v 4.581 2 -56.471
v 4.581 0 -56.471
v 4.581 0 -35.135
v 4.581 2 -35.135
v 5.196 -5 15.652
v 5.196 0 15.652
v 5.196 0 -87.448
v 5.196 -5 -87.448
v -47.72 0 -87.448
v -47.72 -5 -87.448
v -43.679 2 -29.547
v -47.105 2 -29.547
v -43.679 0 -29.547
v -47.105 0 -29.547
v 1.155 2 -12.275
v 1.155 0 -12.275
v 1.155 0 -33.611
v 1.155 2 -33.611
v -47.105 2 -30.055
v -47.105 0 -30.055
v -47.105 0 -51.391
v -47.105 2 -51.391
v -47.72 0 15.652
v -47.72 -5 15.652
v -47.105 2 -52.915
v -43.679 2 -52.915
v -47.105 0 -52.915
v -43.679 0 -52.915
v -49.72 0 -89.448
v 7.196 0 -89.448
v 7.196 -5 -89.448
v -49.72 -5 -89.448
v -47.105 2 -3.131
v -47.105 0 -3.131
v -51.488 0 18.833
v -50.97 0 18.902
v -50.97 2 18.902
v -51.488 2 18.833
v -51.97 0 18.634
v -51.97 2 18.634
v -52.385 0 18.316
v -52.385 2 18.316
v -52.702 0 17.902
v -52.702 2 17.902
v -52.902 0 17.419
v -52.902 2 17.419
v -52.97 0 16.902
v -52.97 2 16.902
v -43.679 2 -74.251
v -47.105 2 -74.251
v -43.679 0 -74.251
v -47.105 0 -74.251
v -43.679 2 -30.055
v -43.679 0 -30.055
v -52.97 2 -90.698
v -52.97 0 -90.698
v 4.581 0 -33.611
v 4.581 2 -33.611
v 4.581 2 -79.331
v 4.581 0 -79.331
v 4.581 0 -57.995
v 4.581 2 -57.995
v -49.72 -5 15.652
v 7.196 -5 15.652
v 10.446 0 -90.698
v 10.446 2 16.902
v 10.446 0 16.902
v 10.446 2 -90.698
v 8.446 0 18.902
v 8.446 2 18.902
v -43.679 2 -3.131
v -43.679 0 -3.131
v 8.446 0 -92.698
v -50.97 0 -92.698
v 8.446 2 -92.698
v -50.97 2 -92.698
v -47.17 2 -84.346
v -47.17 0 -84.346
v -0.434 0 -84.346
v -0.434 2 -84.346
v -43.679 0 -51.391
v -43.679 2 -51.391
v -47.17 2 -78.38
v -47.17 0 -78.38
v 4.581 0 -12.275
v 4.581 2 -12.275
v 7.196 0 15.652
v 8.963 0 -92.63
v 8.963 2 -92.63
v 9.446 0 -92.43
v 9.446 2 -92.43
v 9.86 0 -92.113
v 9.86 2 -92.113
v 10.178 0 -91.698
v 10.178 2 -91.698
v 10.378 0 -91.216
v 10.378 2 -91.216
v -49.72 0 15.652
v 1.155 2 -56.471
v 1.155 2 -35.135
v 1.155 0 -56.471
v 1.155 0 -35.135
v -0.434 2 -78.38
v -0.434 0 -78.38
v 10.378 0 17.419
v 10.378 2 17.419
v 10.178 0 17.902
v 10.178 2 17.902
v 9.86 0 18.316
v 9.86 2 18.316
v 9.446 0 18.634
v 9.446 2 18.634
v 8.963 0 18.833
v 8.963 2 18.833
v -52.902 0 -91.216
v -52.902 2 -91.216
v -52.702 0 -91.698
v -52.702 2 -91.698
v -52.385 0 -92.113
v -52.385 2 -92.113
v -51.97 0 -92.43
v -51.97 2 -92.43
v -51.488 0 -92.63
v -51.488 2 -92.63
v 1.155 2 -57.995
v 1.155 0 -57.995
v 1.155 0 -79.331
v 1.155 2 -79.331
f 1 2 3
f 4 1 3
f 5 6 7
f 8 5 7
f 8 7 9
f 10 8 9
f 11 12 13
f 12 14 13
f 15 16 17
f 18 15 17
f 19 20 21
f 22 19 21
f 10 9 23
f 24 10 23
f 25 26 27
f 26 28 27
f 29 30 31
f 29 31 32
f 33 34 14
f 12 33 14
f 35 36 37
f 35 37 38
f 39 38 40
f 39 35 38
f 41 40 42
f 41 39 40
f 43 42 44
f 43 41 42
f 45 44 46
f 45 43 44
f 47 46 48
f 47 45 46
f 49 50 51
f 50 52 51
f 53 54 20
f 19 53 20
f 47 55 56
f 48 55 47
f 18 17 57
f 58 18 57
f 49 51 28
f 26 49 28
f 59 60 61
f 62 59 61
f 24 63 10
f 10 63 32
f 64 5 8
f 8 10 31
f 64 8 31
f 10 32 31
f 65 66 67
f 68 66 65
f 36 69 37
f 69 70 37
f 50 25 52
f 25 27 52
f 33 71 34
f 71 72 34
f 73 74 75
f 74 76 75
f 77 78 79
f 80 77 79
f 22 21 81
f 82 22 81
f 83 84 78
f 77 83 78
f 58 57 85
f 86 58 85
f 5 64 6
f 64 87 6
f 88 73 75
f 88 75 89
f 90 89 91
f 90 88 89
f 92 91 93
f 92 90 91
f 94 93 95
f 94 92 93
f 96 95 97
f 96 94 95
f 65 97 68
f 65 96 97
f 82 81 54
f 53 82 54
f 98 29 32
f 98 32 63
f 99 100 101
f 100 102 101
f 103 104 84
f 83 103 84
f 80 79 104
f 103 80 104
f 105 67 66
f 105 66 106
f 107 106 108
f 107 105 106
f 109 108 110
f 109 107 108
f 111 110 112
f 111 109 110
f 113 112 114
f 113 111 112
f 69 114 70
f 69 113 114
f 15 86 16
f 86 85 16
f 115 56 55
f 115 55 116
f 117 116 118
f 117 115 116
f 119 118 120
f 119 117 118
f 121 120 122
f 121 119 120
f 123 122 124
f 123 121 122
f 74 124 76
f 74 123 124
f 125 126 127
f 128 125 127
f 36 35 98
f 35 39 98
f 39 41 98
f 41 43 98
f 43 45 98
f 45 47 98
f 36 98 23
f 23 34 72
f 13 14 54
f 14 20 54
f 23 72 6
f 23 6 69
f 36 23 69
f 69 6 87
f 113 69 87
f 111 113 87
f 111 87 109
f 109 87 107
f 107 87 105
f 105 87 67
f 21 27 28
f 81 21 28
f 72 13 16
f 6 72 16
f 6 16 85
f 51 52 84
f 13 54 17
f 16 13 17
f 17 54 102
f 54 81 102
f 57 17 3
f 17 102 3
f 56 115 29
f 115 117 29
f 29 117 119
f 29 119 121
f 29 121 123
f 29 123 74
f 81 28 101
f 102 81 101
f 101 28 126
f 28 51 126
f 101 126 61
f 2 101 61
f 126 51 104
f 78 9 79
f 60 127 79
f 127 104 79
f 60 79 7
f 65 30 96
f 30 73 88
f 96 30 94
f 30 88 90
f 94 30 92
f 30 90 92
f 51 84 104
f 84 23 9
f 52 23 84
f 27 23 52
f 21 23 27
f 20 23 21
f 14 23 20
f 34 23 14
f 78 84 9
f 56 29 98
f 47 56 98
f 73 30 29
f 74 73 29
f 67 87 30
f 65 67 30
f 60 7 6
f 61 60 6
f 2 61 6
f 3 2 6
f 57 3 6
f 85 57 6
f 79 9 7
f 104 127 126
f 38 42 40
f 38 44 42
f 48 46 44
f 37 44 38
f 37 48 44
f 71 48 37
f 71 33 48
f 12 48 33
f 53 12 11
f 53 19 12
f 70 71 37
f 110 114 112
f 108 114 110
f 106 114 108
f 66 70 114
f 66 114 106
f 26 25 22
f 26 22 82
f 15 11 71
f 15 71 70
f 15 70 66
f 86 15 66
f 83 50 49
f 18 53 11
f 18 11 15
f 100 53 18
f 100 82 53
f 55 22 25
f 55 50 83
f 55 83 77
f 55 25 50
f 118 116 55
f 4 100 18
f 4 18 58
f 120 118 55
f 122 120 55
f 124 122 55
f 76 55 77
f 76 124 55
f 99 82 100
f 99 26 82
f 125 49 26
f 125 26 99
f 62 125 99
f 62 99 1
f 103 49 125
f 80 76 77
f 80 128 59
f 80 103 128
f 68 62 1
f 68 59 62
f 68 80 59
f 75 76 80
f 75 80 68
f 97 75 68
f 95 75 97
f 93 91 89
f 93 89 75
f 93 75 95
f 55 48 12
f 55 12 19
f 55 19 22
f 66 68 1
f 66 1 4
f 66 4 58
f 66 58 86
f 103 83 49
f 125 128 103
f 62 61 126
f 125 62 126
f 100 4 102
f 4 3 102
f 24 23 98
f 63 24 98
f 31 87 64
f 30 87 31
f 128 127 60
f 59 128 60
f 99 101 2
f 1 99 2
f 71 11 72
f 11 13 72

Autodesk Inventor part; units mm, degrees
ref_plane "YZ Plane" through (0, 0, 0) normal (1, 0, 0) x (0, 1, 0)
ref_plane "XZ Plane" through (0, 0, 0) normal (0, 1, 0) x (-1, 0, 0)
ref_plane "XY Plane" through (0, 0, 0) normal (0, 0, 1) x (1, 0, 0)
sketch "Náčrt1" plane through (0, 0, 0) normal (0, 1, 0) x (-1, 0, 0)
  line L0 (-6.677663, 17.076554) -> (49.20234, 17.076554)
  line L1 (-9.217661, 14.536556) -> (-9.217661, -88.33345)
  line L2 (-6.677663, -90.873447) -> (49.20234, -90.873447)
  line L3 (51.742337, 14.536556) -> (51.742337, -88.33345)
  line L4 (47.105338, -3.131448) -> (47.105338, -74.251447)
  line L5 (43.679337, -3.131448) -> (47.105338, -3.131448)
  line L6 (43.679337, -29.547447) -> (43.679337, -3.131448)
  line L7 (43.679337, -29.547447) -> (47.105338, -29.547447)
  line L8 (43.679337, -30.055447) -> (47.105338, -30.055447)
  line L9 (43.679337, -51.391447) -> (43.679337, -30.055447)
  line L10 (47.105338, -51.391447) -> (43.679337, -51.391447)
  line L11 (43.679337, -52.915447) -> (47.105338, -52.915447)
  line L12 (43.679337, -74.251447) -> (43.679337, -52.915447)
  line L13 (47.105338, -74.251447) -> (43.679337, -74.251447)
  line L14 (0.434339, -78.380447) -> (47.170339, -78.380447)
  line L15 (47.170339, -84.346448) -> (47.170339, -78.380447)
  line L16 (47.170339, -84.346448) -> (0.434339, -84.346448)
  line L17 (0.434339, -84.346448) -> (0.434339, -78.380447)
  line L18 (-1.154661, -57.995446) -> (-1.154661, -79.331446)
  line L19 (-4.580662, -79.331446) -> (-4.580662, -12.275449)
  line L20 (-1.154661, -79.331446) -> (-4.580662, -79.331446)
  line L21 (-4.580662, -57.995446) -> (-1.154661, -57.995446)
  line L22 (-1.154661, -56.471446) -> (-4.580662, -56.471446)
  line L23 (-1.154661, -35.135447) -> (-1.154661, -56.471446)
  line L24 (-4.580662, -35.135447) -> (-1.154661, -35.135447)
  line L25 (-1.154661, -33.611447) -> (-4.580662, -33.611447)
  line L26 (-1.154661, -12.275449) -> (-1.154661, -33.611447)
  line L27 (-4.580662, -12.275449) -> (-1.154661, -12.275449)
  circle A0 centre (-6.686866, -88.348377) radius 2.522363
  circle A1 centre (49.198008, -88.332369) radius 2.54409
  circle A2 centre (49.211542, 14.551484) radius 2.522363
  circle A3 centre (-6.692632, 14.545779) radius 2.522319
  line L28 (51.742337, 17.076554) -> (-9.217661, 17.076554)
  line L29 (-9.217661, 17.076554) -> (-9.217661, -90.873447)
  line L30 (-9.217661, -90.873447) -> (51.742337, -90.873447)
  line L31 (51.742337, -90.873447) -> (51.742337, 17.076554)
  line L32 (-1.154661, -12.275449) -> (-4.580662, -12.275449)
  line L33 (-4.580662, -12.275449) -> (-4.580662, -33.611447)
  line L34 (-4.580662, -33.611447) -> (-1.154661, -33.611447)
  line L35 (-1.154661, -33.611447) -> (-1.154661, -12.275449)
  line L36 (-4.580662, -35.135447) -> (-1.154661, -35.135447)
  line L37 (-1.154661, -35.135447) -> (-1.154661, -56.471446)
  line L38 (-1.154661, -56.471446) -> (-4.580662, -56.471446)
  line L39 (-4.580662, -56.471446) -> (-4.580662, -35.135447)
  line L40 (-4.580662, -57.995446) -> (-1.154661, -57.995446)
  line L41 (-1.154661, -57.995446) -> (-1.154661, -79.331446)
  line L42 (-1.154661, -79.331446) -> (-4.580662, -79.331446)
  line L43 (-4.580662, -79.331446) -> (-4.580662, -57.995446)
  line L44 (0.434339, -84.346448) -> (47.170339, -84.346448)
  line L45 (47.170339, -84.346448) -> (47.170339, -78.380447)
  line L46 (47.170339, -78.380447) -> (0.434339, -78.380447)
  line L47 (0.434339, -78.380447) -> (0.434339, -84.346448)
  line L48 (43.679337, -74.251447) -> (47.105338, -74.251447)
  line L49 (47.105338, -74.251447) -> (47.105338, -52.915447)
  line L50 (47.105338, -52.915447) -> (43.679337, -52.915447)
  line L51 (43.679337, -52.915447) -> (43.679337, -74.251447)
  line L52 (47.105338, -30.055447) -> (43.679337, -30.055447)
  line L53 (43.679337, -30.055447) -> (43.679337, -51.391447)
  line L54 (43.679337, -51.391447) -> (47.105338, -51.391447)
  line L55 (47.105338, -51.391447) -> (47.105338, -30.055447)
  line L56 (43.679337, -29.547447) -> (47.105338, -29.547447)
  line L57 (47.105338, -29.547447) -> (47.105338, -3.131448)
  line L58 (47.105338, -3.131448) -> (43.679337, -3.131448)
  line L59 (43.679337, -3.131448) -> (43.679337, -29.547447)
  point P0 (0, 0)
  dimension "d0" = 0
  dimension "d1" = 0
  dimension "d2" = 0
  dimension "d3" = 0
sketch "Náčrt1 outline for Vysunutí1" plane through (0, 0, 0) normal (0, 1, 0) x (-1, 0, 0)
  line L0 (51.742337, 14.536556) -> (51.742337, 17.076554)
  line L1 (51.742337, -88.33345) -> (51.742337, 14.536556)
  line L2 (51.742337, 17.076554) -> (49.20234, 17.076554)
  line L3 (51.742337, -90.873447) -> (51.742337, -88.33345)
  line L4 (49.20234, 17.076554) -> (-6.677663, 17.076554)
  line L5 (49.20234, -90.873447) -> (51.742337, -90.873447)
  line L6 (-6.677663, 17.076554) -> (-9.217661, 17.076554)
  line L7 (-6.677663, -90.873447) -> (49.20234, -90.873447)
  line L8 (-9.217661, 17.076554) -> (-9.217661, 14.536556)
  line L9 (-9.217661, -90.873447) -> (-6.677663, -90.873447)
  line L10 (-9.217661, 14.536556) -> (-9.217661, -88.33345)
  line L11 (-9.217661, -88.33345) -> (-9.217661, -90.873447)
  line L12 (-4.580662, -57.995446) -> (-1.154661, -57.995446)
  line L13 (-4.580662, -79.331446) -> (-4.580662, -57.995446)
  line L14 (-1.154661, -79.331446) -> (-4.580662, -79.331446)
  line L15 (-1.154661, -57.995446) -> (-1.154661, -79.331446)
  line L16 (-4.580662, -56.471446) -> (-4.580662, -35.135447)
  line L17 (-1.154661, -56.471446) -> (-4.580662, -56.471446)
  line L18 (-1.154661, -35.135447) -> (-1.154661, -56.471446)
  line L19 (-4.580662, -35.135447) -> (-1.154661, -35.135447)
  line L20 (0.434339, -84.346448) -> (0.434339, -78.380447)
  line L21 (47.170339, -84.346448) -> (0.434339, -84.346448)
  line L22 (47.170339, -78.380447) -> (47.170339, -84.346448)
  line L23 (0.434339, -78.380447) -> (47.170339, -78.380447)
  line L24 (47.105338, -52.915447) -> (47.105338, -74.251447)
  line L25 (43.679337, -52.915447) -> (47.105338, -52.915447)
  line L26 (43.679337, -74.251447) -> (43.679337, -52.915447)
  line L27 (47.105338, -74.251447) -> (43.679337, -74.251447)
  line L28 (-4.580662, -33.611447) -> (-4.580662, -12.275449)
  line L29 (-1.154661, -33.611447) -> (-4.580662, -33.611447)
  line L30 (-1.154661, -12.275449) -> (-1.154661, -33.611447)
  line L31 (-4.580662, -12.275449) -> (-1.154661, -12.275449)
  line L32 (47.105338, -30.055447) -> (47.105338, -51.391447)
  line L33 (43.679337, -30.055447) -> (47.105338, -30.055447)
  line L34 (43.679337, -51.391447) -> (43.679337, -30.055447)
  line L35 (47.105338, -51.391447) -> (43.679337, -51.391447)
  line L36 (47.105338, -29.547447) -> (43.679337, -29.547447)
  line L37 (47.105338, -3.131448) -> (47.105338, -29.547447)
  line L38 (43.679337, -3.131448) -> (47.105338, -3.131448)
  line L39 (43.679337, -29.547447) -> (43.679337, -3.131448)
extrude "Vysunutí1" add sketch "Náčrt1 outline for Vysunutí1" along normal blind 2
sketch "Náčrt2" plane through (0, 2, 0) normal (0, 1, 0) x (1, 0, 0)
  line L0 (-51.742337, -17.076554) -> (9.217661, -17.076554)
  line L1 (9.217661, -17.076554) -> (9.217661, 90.873447)
  line L2 (9.217661, 90.873447) -> (-51.742337, 90.873447)
  line L3 (-51.742337, 90.873447) -> (-51.742337, -17.076554)
  line L4 (-47.105338, 29.547447) -> (-43.679337, 29.547447)
  line L5 (-43.679337, 29.547447) -> (-43.679337, 3.131448)
  line L6 (-43.679337, 3.131448) -> (-47.105338, 3.131448)
  line L7 (-47.105338, 3.131448) -> (-47.105338, 29.547447)
  line L8 (-47.105338, 30.055447) -> (-47.105338, 51.391447)
  line L9 (-47.105338, 51.391447) -> (-43.679337, 51.391447)
  line L10 (-43.679337, 51.391447) -> (-43.679337, 30.055447)
  line L11 (-43.679337, 30.055447) -> (-47.105338, 30.055447)
  line L12 (4.580662, 57.995446) -> (1.154661, 57.995446)
  line L13 (1.154661, 57.995446) -> (1.154661, 79.331446)
  line L14 (1.154661, 79.331446) -> (4.580662, 79.331446)
  line L15 (4.580662, 79.331446) -> (4.580662, 57.995446)
  line L16 (4.580662, 56.471446) -> (4.580662, 35.135447)
  line L17 (4.580662, 35.135447) -> (1.154661, 35.135447)
  line L18 (1.154661, 35.135447) -> (1.154661, 56.471446)
  line L19 (1.154661, 56.471446) -> (4.580662, 56.471446)
  line L20 (4.580662, 33.611447) -> (4.580662, 12.275449)
  line L21 (4.580662, 12.275449) -> (1.154661, 12.275449)
  line L22 (1.154661, 12.275449) -> (1.154661, 33.611447)
  line L23 (1.154661, 33.611447) -> (4.580662, 33.611447)
  line L24 (-0.434339, 84.346448) -> (-0.434339, 78.380447)
  line L25 (-0.434339, 78.380447) -> (-47.170339, 78.380447)
  line L26 (-47.170339, 78.380447) -> (-47.170339, 84.346448)
  line L27 (-47.170339, 84.346448) -> (-0.434339, 84.346448)
  line L28 (-47.105338, 52.915447) -> (-47.105338, 74.251447)
  line L29 (-47.105338, 74.251447) -> (-43.679337, 74.251447)
  line L30 (-43.679337, 74.251447) -> (-43.679337, 52.915447)
  line L31 (-43.679337, 52.915447) -> (-47.105338, 52.915447)
  line L32 (-52.742337, -18.076554) -> (10.217661, -18.076554)
  line L33 (10.217661, -18.076554) -> (10.217661, 91.873447)
  line L34 (10.217661, 91.873447) -> (-52.742337, 91.873447)
  line L35 (-52.742337, 91.873447) -> (-52.742337, -18.076554)
  point P0 (0, 0)
  dimension "d6" = 1
extrude "Vysunutí2" add sketch "Náčrt2" against normal up to surface (2 mm away) contours L35 L34 L33 L32
sketch "Náčrt3" plane through (0, 2, 0) normal (0, 1, 0) x (1, 0, 0)
  line L0 (10.217661, -18.076554) -> (10.217661, 91.873447)
  line L1 (10.217661, 91.873447) -> (-52.742337, 91.873447)
  line L2 (-52.742337, 91.873447) -> (-52.742337, -18.076554)
  line L3 (-52.742337, -18.076554) -> (10.217661, -18.076554)
  line L4 (-47.105338, 29.547447) -> (-43.679337, 29.547447)
  line L5 (-43.679337, 29.547447) -> (-43.679337, 3.131448)
  line L6 (-43.679337, 3.131448) -> (-47.105338, 3.131448)
  line L7 (-47.105338, 3.131448) -> (-47.105338, 29.547447)
  line L8 (-47.105338, 30.055447) -> (-47.105338, 51.391447)
  line L9 (-47.105338, 51.391447) -> (-43.679337, 51.391447)
  line L10 (-43.679337, 51.391447) -> (-43.679337, 30.055447)
  line L11 (-43.679337, 30.055447) -> (-47.105338, 30.055447)
  line L12 (4.580662, 57.995446) -> (1.154661, 57.995446)
  line L13 (1.154661, 57.995446) -> (1.154661, 79.331446)
  line L14 (1.154661, 79.331446) -> (4.580662, 79.331446)
  line L15 (4.580662, 79.331446) -> (4.580662, 57.995446)
  line L16 (4.580662, 56.471446) -> (4.580662, 35.135447)
  line L17 (4.580662, 35.135447) -> (1.154661, 35.135447)
  line L18 (1.154661, 35.135447) -> (1.154661, 56.471446)
  line L19 (1.154661, 56.471446) -> (4.580662, 56.471446)
  line L20 (4.580662, 33.611447) -> (4.580662, 12.275449)
  line L21 (4.580662, 12.275449) -> (1.154661, 12.275449)
  line L22 (1.154661, 12.275449) -> (1.154661, 33.611447)
  line L23 (1.154661, 33.611447) -> (4.580662, 33.611447)
  line L24 (-0.434339, 84.346448) -> (-0.434339, 78.380447)
  line L25 (-0.434339, 78.380447) -> (-47.170339, 78.380447)
  line L26 (-47.170339, 78.380447) -> (-47.170339, 84.346448)
  line L27 (-47.170339, 84.346448) -> (-0.434339, 84.346448)
  line L28 (-47.105338, 52.915447) -> (-47.105338, 74.251447)
  line L29 (-47.105338, 74.251447) -> (-43.679337, 74.251447)
  line L30 (-43.679337, 74.251447) -> (-43.679337, 52.915447)
  line L31 (-43.679337, 52.915447) -> (-47.105338, 52.915447)
  line L32 (10.445662, -18.901553) -> (-52.970338, -18.901553)
  line L33 (-52.970338, 92.698447) -> (10.445662, 92.698447)
  line L34 (-52.970338, 92.698447) -> (-52.970338, -18.901553)
  line L35 (10.445662, -18.901553) -> (10.445662, 92.698447)
  line L36 (10.217661, 91.873447) -> (-52.742337, 91.873447)
  line L37 (-21.262338, 91.873447) -> (-21.262338, -18.076554) construction
  line L38 (10.217661, -18.076554) -> (10.217661, 91.873447)
  line L39 (10.217661, 36.898447) -> (-52.742337, 36.898447) construction
  point P0 (0, 0)
  dimension "d10" = 111.6
  dimension "d11" = 63.416
extrude "Vysunutí3" add sketch "Náčrt3" against normal up to surface (2 mm away) contours L32 L34 L33 L35
fillet "Zaoblení1" radius 2 4 edges at (10.4457, 1, -92.6984) (-52.9703, 1, -92.6984) (-52.9703, 1, 18.9016) (10.4457, 1, 18.9016)
sketch "Náčrt4" plane through (0, 2, 0) normal (0, 1, 0) x (1, 0, 0)
  arc A0 (8.445662, -18.901553) -> (10.445662, -16.901553) centre (8.445662, -16.901553) ccw
  line L0 (10.445662, -16.901553) -> (10.445662, 90.698447)
  arc A1 (10.445662, 90.698447) -> (8.445662, 92.698447) centre (8.445662, 90.698447) ccw
  line L1 (8.445662, 92.698447) -> (-50.970338, 92.698447)
  arc A2 (-50.970338, 92.698447) -> (-52.970338, 90.698447) centre (-50.970338, 90.698447) ccw
  line L2 (-52.970338, 90.698447) -> (-52.970338, -16.901553)
  arc A3 (-52.970338, -16.901553) -> (-50.970338, -18.901553) centre (-50.970338, -16.901553) ccw
  line L3 (-50.970338, -18.901553) -> (8.445662, -18.901553)
  line L4 (-47.105338, 29.547447) -> (-43.679337, 29.547447)
  line L5 (-43.679337, 29.547447) -> (-43.679337, 3.131448)
  line L6 (-43.679337, 3.131448) -> (-47.105338, 3.131448)
  line L7 (-47.105338, 3.131448) -> (-47.105338, 29.547447)
  line L8 (-47.105338, 30.055447) -> (-47.105338, 51.391447)
  line L9 (-47.105338, 51.391447) -> (-43.679337, 51.391447)
  line L10 (-43.679337, 51.391447) -> (-43.679337, 30.055447)
  line L11 (-43.679337, 30.055447) -> (-47.105338, 30.055447)
  line L12 (4.580662, 57.995446) -> (1.154661, 57.995446)
  line L13 (1.154661, 57.995446) -> (1.154661, 79.331446)
  line L14 (1.154661, 79.331446) -> (4.580662, 79.331446)
  line L15 (4.580662, 79.331446) -> (4.580662, 57.995446)
  line L16 (4.580662, 56.471446) -> (4.580662, 35.135447)
  line L17 (4.580662, 35.135447) -> (1.154661, 35.135447)
  line L18 (1.154661, 35.135447) -> (1.154661, 56.471446)
  line L19 (1.154661, 56.471446) -> (4.580662, 56.471446)
  line L20 (4.580662, 33.611447) -> (4.580662, 12.275449)
  line L21 (4.580662, 12.275449) -> (1.154661, 12.275449)
  line L22 (1.154661, 12.275449) -> (1.154661, 33.611447)
  line L23 (1.154661, 33.611447) -> (4.580662, 33.611447)
  line L24 (-0.434339, 84.346448) -> (-0.434339, 78.380447)
  line L25 (-0.434339, 78.380447) -> (-47.170339, 78.380447)
  line L26 (-47.170339, 78.380447) -> (-47.170339, 84.346448)
  line L27 (-47.170339, 84.346448) -> (-0.434339, 84.346448)
  line L28 (-47.105338, 52.915447) -> (-47.105338, 74.251447)
  line L29 (-47.105338, 74.251447) -> (-43.679337, 74.251447)
  line L30 (-43.679337, 74.251447) -> (-43.679337, 52.915447)
  line L31 (-43.679337, 52.915447) -> (-47.105338, 52.915447)
  line L32 (7.195662, -15.651553) -> (7.195662, 89.448447)
  line L33 (7.195662, 89.448447) -> (-49.720338, 89.448447)
  line L34 (-49.720338, 89.448447) -> (-49.720338, -15.651553)
  line L35 (5.195662, -15.651553) -> (5.195662, 87.448447)
  line L36 (5.195662, 87.448447) -> (-47.720338, 87.448447)
  line L37 (-47.720338, 87.448447) -> (-47.720338, -15.651553)
  line L38 (7.195662, -15.651553) -> (5.195662, -15.651553)
  line L39 (-47.720338, -15.651553) -> (-49.720338, -15.651553)
  point P0 (0, 0)
  dimension "d17" = 2
  dimension "d18" = 2
  dimension "d19" = 3.25
  dimension "d20" = 2
extrude "Vysunutí4" add sketch "Náčrt4" against normal blind 7 contours L38 L35 L36 L37 L39 L34 L33 L32
properties part number "arduino_lid_3D tisk"
